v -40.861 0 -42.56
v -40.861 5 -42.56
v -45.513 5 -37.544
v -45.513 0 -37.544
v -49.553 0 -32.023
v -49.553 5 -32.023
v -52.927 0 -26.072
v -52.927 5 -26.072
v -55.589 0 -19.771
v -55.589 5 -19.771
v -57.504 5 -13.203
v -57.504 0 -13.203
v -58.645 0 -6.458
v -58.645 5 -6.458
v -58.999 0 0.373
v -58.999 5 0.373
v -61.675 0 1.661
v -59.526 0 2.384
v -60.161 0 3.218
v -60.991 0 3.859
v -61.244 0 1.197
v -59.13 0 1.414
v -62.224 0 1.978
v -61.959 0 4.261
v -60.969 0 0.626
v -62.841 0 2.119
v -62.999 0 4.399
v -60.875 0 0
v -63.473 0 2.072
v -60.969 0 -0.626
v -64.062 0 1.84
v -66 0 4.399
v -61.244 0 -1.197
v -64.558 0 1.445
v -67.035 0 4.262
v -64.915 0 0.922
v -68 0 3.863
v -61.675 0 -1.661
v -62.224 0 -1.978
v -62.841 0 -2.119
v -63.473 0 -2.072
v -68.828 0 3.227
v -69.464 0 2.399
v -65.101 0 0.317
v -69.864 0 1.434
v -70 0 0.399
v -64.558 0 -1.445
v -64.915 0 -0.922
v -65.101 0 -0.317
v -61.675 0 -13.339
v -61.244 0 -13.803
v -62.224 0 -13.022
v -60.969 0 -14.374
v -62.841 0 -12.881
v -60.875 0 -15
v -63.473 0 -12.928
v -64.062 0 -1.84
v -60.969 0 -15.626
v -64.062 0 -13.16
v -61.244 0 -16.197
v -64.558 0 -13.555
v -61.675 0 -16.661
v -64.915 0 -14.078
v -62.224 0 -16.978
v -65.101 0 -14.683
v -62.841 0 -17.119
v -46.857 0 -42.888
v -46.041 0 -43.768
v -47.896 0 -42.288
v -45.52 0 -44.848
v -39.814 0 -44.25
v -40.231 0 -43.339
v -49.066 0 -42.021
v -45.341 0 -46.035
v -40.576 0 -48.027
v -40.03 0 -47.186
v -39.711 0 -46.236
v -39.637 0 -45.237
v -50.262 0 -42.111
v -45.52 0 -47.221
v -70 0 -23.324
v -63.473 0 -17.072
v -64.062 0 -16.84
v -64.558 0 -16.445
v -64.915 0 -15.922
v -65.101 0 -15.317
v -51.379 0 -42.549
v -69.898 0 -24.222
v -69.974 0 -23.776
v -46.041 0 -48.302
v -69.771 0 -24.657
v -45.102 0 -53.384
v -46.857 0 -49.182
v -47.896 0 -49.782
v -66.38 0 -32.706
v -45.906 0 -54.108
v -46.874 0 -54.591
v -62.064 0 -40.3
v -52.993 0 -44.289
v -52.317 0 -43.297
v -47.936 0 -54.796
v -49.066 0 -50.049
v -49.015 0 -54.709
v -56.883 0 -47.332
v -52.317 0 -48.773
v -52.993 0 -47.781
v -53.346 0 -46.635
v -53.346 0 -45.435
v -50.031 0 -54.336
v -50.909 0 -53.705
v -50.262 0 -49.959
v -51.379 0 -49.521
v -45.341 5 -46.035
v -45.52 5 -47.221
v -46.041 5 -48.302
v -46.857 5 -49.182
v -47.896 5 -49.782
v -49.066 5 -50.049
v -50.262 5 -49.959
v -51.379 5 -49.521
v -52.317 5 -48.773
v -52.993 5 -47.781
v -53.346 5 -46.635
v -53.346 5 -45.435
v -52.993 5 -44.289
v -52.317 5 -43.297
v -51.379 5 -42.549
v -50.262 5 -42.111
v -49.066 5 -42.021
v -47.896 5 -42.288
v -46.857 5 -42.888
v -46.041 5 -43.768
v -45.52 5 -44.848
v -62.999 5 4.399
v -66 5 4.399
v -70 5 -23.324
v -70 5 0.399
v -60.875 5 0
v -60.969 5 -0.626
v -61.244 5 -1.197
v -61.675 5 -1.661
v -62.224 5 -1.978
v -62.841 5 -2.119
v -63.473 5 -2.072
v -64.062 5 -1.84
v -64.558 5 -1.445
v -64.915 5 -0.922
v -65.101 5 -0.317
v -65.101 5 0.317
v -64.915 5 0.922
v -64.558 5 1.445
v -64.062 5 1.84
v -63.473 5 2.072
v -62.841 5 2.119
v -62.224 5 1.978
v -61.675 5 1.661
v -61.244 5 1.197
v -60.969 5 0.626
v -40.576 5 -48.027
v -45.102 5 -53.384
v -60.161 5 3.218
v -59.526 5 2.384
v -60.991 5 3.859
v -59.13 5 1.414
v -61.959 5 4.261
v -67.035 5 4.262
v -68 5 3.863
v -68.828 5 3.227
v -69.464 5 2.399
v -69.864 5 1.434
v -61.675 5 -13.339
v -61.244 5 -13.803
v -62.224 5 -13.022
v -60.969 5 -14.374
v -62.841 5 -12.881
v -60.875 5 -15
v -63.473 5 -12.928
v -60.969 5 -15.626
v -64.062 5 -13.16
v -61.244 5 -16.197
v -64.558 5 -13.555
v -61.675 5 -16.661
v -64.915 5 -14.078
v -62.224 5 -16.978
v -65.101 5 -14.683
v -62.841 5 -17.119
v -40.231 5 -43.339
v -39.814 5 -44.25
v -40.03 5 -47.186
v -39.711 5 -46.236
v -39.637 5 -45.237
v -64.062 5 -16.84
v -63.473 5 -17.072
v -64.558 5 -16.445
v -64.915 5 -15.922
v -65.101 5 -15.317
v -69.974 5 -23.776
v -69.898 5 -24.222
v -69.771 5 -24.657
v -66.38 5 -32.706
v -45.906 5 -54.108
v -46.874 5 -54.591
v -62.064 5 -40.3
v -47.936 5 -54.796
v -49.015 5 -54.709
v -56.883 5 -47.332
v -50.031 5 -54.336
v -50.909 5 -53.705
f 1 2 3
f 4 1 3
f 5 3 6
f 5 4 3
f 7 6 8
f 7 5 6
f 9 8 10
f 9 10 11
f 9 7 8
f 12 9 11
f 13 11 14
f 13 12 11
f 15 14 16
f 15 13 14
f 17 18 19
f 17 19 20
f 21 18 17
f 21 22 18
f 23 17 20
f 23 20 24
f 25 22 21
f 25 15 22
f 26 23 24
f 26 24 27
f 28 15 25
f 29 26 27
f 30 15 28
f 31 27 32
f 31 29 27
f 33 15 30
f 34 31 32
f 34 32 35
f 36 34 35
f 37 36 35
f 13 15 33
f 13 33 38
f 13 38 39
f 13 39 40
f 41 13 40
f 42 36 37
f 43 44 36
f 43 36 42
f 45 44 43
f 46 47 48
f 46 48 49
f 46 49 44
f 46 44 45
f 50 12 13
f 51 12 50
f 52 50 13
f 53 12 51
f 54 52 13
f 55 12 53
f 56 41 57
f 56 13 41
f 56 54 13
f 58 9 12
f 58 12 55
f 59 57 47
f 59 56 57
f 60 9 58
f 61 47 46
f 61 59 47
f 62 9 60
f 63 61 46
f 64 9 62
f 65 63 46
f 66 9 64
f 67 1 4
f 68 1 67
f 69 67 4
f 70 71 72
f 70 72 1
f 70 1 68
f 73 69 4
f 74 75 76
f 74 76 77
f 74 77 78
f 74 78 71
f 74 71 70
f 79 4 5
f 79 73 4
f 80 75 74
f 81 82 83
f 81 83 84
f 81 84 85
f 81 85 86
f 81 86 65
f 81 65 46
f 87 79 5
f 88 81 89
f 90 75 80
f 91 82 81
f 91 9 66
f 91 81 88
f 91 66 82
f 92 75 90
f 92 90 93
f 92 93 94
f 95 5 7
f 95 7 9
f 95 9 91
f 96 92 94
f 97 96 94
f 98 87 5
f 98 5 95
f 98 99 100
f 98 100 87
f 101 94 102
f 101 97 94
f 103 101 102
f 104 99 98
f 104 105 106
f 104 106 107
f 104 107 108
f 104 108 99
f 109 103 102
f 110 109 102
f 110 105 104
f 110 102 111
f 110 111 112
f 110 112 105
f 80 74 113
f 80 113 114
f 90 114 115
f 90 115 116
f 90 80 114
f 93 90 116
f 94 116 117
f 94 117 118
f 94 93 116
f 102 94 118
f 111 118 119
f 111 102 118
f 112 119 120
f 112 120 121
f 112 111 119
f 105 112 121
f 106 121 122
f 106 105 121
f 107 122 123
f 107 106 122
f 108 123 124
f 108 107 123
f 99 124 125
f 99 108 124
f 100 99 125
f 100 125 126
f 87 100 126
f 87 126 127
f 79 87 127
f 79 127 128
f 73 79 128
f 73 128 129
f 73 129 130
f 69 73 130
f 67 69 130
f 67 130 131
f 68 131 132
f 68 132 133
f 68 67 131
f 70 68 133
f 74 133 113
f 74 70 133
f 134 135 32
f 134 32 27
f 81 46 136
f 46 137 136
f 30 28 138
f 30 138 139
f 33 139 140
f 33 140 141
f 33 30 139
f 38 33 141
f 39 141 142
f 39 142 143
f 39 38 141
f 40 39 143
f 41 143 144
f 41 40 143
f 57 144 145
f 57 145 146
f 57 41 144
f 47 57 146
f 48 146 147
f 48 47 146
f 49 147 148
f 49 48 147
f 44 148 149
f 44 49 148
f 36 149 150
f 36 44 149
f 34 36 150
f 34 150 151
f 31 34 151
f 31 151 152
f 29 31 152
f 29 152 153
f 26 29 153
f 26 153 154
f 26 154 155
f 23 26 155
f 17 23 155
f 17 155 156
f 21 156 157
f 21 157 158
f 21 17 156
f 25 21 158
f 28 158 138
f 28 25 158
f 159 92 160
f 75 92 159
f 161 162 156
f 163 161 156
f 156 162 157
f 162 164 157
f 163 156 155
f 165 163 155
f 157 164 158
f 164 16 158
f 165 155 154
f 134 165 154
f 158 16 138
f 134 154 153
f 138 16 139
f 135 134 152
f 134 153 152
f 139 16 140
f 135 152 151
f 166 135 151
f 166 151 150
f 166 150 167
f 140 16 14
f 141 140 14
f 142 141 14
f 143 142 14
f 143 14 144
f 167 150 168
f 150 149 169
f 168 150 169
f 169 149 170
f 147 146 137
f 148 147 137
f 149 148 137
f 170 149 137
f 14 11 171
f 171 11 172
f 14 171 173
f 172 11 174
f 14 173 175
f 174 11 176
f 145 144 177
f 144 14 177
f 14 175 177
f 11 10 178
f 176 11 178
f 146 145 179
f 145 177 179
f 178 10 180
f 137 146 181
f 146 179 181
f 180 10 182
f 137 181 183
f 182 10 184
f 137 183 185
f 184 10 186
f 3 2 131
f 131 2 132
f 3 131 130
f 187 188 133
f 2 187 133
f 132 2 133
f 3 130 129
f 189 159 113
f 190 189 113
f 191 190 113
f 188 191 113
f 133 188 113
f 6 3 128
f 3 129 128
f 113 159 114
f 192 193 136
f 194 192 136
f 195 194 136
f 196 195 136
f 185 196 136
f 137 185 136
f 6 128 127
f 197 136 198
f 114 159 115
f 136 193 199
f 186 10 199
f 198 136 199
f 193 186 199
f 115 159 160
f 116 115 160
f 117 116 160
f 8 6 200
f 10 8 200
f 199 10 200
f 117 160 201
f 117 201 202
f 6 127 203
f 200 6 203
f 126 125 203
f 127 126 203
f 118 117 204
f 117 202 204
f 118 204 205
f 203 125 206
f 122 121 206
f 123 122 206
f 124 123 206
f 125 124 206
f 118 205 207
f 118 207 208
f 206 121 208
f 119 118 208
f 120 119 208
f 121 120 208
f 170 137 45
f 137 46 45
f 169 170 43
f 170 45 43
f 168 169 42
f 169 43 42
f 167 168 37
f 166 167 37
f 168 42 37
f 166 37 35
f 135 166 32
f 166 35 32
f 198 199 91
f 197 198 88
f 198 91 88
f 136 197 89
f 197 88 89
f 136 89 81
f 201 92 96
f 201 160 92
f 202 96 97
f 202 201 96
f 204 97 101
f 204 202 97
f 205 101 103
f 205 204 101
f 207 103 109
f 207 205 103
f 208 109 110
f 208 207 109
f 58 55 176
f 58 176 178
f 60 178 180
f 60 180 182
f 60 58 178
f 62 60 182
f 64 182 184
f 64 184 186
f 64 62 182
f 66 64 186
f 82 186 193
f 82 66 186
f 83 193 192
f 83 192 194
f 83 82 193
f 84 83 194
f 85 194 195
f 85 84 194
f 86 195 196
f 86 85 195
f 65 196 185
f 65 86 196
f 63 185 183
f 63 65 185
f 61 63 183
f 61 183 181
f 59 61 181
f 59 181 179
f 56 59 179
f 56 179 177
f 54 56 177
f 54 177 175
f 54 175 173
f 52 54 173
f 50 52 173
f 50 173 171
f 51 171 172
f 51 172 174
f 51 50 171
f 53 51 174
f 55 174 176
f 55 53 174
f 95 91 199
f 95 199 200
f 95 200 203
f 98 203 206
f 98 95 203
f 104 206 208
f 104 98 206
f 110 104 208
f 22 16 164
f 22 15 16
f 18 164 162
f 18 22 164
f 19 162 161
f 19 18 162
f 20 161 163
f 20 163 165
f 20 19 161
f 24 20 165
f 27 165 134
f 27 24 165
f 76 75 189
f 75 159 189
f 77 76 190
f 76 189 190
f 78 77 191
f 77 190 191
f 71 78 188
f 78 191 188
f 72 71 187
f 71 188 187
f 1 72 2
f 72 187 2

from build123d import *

# Parameters (mm, degrees)
SKETCH1_R               = 4.025
SKETCH1_R_2             = 2.125
BOSS_EXTRUDE1_DEPTH     = 5
SKETCH2_W               = 28.904595792
SKETCH2_H               = 55.332112
CUT_EXTRUDE1_DEPTH      = 1
CUT_EXTRUDE1_DEPTH_BACK = 6
SKETCH3_W               = 24.207106467
SKETCH3_H               = 21.100530829
CUT_EXTRUDE2_DEPTH      = 1
CUT_EXTRUDE2_DEPTH_BACK = 6
FILLET1_R               = 4


with BuildPart() as part:
    # Sketch1 → Boss-Extrude1 (new body)
    with BuildSketch(Plane(origin=(0, 0, 0), x_dir=(1, 0, 0), z_dir=(0, 1, 0))):
        with BuildLine():
            Line((-47.75734818, 56.526415903), (-38.07680463, 45.068358625))
            ThreePointArc((-38.07680463, 45.068358625), (-56.716415256, 16.255714087), (-56.169167779, -18.056151058))
            Line((-56.169167779, -18.056151058), (-70.449464672, -22.646697938))
            ThreePointArc((-70.449464672, -22.646697938), (-71.135842864, 20.388522754), (-47.75734818, 56.526415903))
        make_face()
        with Locations((-49.366374859, 46.034889304)):
            Circle(SKETCH1_R, mode=Mode.SUBTRACT)
        with Locations((-63, 0)):
            Circle(SKETCH1_R_2, mode=Mode.SUBTRACT)
        with Locations((-63, -15)):
            Circle(SKETCH1_R_2, mode=Mode.SUBTRACT)
        with Locations((-63, 15)):
            Circle(SKETCH1_R_2, mode=Mode.SUBTRACT)
    extrude(amount=BOSS_EXTRUDE1_DEPTH)

    # Sketch2 → Cut-Extrude1 (cut, two sides)
    with BuildSketch(Plane(origin=(0, 5, 0), x_dir=(1, 0, 0), z_dir=(0, 1, 0))) as cut_extrude1_sk:
        with Locations((-84.452297896, 0)):
            Rectangle(SKETCH2_W, SKETCH2_H)
    extrude(amount=CUT_EXTRUDE1_DEPTH, mode=Mode.SUBTRACT)
    extrude(cut_extrude1_sk.sketch, amount=-CUT_EXTRUDE1_DEPTH_BACK, mode=Mode.SUBTRACT)

    # Sketch3 → Cut-Extrude2 (cut, two sides)
    with BuildSketch(Plane(origin=(0, 5, 0), x_dir=(1, 0, 0), z_dir=(0, 1, 0))) as cut_extrude2_sk:
        with Locations((-57.896446767, -14.949043558)):
            Rectangle(SKETCH3_W, SKETCH3_H)
    extrude(amount=CUT_EXTRUDE2_DEPTH, mode=Mode.SUBTRACT)
    extrude(cut_extrude2_sk.sketch, amount=-CUT_EXTRUDE2_DEPTH_BACK, mode=Mode.SUBTRACT)

    # Fillet1
    fillet1_edges = [part.edges().sort_by_distance(p)[0] for p in [
        (-70, 2.5, -24),
        (-58.835794809, 2.5, 4.398778143),
        (-70, 2.5, 4.398778143),
        (-47.75734818, 2.5, -56.526415903),
        (-38.07680463, 2.5, -45.068358625),
    ]]
    fillet(fillet1_edges, radius=FILLET1_R)


solid = part.part
